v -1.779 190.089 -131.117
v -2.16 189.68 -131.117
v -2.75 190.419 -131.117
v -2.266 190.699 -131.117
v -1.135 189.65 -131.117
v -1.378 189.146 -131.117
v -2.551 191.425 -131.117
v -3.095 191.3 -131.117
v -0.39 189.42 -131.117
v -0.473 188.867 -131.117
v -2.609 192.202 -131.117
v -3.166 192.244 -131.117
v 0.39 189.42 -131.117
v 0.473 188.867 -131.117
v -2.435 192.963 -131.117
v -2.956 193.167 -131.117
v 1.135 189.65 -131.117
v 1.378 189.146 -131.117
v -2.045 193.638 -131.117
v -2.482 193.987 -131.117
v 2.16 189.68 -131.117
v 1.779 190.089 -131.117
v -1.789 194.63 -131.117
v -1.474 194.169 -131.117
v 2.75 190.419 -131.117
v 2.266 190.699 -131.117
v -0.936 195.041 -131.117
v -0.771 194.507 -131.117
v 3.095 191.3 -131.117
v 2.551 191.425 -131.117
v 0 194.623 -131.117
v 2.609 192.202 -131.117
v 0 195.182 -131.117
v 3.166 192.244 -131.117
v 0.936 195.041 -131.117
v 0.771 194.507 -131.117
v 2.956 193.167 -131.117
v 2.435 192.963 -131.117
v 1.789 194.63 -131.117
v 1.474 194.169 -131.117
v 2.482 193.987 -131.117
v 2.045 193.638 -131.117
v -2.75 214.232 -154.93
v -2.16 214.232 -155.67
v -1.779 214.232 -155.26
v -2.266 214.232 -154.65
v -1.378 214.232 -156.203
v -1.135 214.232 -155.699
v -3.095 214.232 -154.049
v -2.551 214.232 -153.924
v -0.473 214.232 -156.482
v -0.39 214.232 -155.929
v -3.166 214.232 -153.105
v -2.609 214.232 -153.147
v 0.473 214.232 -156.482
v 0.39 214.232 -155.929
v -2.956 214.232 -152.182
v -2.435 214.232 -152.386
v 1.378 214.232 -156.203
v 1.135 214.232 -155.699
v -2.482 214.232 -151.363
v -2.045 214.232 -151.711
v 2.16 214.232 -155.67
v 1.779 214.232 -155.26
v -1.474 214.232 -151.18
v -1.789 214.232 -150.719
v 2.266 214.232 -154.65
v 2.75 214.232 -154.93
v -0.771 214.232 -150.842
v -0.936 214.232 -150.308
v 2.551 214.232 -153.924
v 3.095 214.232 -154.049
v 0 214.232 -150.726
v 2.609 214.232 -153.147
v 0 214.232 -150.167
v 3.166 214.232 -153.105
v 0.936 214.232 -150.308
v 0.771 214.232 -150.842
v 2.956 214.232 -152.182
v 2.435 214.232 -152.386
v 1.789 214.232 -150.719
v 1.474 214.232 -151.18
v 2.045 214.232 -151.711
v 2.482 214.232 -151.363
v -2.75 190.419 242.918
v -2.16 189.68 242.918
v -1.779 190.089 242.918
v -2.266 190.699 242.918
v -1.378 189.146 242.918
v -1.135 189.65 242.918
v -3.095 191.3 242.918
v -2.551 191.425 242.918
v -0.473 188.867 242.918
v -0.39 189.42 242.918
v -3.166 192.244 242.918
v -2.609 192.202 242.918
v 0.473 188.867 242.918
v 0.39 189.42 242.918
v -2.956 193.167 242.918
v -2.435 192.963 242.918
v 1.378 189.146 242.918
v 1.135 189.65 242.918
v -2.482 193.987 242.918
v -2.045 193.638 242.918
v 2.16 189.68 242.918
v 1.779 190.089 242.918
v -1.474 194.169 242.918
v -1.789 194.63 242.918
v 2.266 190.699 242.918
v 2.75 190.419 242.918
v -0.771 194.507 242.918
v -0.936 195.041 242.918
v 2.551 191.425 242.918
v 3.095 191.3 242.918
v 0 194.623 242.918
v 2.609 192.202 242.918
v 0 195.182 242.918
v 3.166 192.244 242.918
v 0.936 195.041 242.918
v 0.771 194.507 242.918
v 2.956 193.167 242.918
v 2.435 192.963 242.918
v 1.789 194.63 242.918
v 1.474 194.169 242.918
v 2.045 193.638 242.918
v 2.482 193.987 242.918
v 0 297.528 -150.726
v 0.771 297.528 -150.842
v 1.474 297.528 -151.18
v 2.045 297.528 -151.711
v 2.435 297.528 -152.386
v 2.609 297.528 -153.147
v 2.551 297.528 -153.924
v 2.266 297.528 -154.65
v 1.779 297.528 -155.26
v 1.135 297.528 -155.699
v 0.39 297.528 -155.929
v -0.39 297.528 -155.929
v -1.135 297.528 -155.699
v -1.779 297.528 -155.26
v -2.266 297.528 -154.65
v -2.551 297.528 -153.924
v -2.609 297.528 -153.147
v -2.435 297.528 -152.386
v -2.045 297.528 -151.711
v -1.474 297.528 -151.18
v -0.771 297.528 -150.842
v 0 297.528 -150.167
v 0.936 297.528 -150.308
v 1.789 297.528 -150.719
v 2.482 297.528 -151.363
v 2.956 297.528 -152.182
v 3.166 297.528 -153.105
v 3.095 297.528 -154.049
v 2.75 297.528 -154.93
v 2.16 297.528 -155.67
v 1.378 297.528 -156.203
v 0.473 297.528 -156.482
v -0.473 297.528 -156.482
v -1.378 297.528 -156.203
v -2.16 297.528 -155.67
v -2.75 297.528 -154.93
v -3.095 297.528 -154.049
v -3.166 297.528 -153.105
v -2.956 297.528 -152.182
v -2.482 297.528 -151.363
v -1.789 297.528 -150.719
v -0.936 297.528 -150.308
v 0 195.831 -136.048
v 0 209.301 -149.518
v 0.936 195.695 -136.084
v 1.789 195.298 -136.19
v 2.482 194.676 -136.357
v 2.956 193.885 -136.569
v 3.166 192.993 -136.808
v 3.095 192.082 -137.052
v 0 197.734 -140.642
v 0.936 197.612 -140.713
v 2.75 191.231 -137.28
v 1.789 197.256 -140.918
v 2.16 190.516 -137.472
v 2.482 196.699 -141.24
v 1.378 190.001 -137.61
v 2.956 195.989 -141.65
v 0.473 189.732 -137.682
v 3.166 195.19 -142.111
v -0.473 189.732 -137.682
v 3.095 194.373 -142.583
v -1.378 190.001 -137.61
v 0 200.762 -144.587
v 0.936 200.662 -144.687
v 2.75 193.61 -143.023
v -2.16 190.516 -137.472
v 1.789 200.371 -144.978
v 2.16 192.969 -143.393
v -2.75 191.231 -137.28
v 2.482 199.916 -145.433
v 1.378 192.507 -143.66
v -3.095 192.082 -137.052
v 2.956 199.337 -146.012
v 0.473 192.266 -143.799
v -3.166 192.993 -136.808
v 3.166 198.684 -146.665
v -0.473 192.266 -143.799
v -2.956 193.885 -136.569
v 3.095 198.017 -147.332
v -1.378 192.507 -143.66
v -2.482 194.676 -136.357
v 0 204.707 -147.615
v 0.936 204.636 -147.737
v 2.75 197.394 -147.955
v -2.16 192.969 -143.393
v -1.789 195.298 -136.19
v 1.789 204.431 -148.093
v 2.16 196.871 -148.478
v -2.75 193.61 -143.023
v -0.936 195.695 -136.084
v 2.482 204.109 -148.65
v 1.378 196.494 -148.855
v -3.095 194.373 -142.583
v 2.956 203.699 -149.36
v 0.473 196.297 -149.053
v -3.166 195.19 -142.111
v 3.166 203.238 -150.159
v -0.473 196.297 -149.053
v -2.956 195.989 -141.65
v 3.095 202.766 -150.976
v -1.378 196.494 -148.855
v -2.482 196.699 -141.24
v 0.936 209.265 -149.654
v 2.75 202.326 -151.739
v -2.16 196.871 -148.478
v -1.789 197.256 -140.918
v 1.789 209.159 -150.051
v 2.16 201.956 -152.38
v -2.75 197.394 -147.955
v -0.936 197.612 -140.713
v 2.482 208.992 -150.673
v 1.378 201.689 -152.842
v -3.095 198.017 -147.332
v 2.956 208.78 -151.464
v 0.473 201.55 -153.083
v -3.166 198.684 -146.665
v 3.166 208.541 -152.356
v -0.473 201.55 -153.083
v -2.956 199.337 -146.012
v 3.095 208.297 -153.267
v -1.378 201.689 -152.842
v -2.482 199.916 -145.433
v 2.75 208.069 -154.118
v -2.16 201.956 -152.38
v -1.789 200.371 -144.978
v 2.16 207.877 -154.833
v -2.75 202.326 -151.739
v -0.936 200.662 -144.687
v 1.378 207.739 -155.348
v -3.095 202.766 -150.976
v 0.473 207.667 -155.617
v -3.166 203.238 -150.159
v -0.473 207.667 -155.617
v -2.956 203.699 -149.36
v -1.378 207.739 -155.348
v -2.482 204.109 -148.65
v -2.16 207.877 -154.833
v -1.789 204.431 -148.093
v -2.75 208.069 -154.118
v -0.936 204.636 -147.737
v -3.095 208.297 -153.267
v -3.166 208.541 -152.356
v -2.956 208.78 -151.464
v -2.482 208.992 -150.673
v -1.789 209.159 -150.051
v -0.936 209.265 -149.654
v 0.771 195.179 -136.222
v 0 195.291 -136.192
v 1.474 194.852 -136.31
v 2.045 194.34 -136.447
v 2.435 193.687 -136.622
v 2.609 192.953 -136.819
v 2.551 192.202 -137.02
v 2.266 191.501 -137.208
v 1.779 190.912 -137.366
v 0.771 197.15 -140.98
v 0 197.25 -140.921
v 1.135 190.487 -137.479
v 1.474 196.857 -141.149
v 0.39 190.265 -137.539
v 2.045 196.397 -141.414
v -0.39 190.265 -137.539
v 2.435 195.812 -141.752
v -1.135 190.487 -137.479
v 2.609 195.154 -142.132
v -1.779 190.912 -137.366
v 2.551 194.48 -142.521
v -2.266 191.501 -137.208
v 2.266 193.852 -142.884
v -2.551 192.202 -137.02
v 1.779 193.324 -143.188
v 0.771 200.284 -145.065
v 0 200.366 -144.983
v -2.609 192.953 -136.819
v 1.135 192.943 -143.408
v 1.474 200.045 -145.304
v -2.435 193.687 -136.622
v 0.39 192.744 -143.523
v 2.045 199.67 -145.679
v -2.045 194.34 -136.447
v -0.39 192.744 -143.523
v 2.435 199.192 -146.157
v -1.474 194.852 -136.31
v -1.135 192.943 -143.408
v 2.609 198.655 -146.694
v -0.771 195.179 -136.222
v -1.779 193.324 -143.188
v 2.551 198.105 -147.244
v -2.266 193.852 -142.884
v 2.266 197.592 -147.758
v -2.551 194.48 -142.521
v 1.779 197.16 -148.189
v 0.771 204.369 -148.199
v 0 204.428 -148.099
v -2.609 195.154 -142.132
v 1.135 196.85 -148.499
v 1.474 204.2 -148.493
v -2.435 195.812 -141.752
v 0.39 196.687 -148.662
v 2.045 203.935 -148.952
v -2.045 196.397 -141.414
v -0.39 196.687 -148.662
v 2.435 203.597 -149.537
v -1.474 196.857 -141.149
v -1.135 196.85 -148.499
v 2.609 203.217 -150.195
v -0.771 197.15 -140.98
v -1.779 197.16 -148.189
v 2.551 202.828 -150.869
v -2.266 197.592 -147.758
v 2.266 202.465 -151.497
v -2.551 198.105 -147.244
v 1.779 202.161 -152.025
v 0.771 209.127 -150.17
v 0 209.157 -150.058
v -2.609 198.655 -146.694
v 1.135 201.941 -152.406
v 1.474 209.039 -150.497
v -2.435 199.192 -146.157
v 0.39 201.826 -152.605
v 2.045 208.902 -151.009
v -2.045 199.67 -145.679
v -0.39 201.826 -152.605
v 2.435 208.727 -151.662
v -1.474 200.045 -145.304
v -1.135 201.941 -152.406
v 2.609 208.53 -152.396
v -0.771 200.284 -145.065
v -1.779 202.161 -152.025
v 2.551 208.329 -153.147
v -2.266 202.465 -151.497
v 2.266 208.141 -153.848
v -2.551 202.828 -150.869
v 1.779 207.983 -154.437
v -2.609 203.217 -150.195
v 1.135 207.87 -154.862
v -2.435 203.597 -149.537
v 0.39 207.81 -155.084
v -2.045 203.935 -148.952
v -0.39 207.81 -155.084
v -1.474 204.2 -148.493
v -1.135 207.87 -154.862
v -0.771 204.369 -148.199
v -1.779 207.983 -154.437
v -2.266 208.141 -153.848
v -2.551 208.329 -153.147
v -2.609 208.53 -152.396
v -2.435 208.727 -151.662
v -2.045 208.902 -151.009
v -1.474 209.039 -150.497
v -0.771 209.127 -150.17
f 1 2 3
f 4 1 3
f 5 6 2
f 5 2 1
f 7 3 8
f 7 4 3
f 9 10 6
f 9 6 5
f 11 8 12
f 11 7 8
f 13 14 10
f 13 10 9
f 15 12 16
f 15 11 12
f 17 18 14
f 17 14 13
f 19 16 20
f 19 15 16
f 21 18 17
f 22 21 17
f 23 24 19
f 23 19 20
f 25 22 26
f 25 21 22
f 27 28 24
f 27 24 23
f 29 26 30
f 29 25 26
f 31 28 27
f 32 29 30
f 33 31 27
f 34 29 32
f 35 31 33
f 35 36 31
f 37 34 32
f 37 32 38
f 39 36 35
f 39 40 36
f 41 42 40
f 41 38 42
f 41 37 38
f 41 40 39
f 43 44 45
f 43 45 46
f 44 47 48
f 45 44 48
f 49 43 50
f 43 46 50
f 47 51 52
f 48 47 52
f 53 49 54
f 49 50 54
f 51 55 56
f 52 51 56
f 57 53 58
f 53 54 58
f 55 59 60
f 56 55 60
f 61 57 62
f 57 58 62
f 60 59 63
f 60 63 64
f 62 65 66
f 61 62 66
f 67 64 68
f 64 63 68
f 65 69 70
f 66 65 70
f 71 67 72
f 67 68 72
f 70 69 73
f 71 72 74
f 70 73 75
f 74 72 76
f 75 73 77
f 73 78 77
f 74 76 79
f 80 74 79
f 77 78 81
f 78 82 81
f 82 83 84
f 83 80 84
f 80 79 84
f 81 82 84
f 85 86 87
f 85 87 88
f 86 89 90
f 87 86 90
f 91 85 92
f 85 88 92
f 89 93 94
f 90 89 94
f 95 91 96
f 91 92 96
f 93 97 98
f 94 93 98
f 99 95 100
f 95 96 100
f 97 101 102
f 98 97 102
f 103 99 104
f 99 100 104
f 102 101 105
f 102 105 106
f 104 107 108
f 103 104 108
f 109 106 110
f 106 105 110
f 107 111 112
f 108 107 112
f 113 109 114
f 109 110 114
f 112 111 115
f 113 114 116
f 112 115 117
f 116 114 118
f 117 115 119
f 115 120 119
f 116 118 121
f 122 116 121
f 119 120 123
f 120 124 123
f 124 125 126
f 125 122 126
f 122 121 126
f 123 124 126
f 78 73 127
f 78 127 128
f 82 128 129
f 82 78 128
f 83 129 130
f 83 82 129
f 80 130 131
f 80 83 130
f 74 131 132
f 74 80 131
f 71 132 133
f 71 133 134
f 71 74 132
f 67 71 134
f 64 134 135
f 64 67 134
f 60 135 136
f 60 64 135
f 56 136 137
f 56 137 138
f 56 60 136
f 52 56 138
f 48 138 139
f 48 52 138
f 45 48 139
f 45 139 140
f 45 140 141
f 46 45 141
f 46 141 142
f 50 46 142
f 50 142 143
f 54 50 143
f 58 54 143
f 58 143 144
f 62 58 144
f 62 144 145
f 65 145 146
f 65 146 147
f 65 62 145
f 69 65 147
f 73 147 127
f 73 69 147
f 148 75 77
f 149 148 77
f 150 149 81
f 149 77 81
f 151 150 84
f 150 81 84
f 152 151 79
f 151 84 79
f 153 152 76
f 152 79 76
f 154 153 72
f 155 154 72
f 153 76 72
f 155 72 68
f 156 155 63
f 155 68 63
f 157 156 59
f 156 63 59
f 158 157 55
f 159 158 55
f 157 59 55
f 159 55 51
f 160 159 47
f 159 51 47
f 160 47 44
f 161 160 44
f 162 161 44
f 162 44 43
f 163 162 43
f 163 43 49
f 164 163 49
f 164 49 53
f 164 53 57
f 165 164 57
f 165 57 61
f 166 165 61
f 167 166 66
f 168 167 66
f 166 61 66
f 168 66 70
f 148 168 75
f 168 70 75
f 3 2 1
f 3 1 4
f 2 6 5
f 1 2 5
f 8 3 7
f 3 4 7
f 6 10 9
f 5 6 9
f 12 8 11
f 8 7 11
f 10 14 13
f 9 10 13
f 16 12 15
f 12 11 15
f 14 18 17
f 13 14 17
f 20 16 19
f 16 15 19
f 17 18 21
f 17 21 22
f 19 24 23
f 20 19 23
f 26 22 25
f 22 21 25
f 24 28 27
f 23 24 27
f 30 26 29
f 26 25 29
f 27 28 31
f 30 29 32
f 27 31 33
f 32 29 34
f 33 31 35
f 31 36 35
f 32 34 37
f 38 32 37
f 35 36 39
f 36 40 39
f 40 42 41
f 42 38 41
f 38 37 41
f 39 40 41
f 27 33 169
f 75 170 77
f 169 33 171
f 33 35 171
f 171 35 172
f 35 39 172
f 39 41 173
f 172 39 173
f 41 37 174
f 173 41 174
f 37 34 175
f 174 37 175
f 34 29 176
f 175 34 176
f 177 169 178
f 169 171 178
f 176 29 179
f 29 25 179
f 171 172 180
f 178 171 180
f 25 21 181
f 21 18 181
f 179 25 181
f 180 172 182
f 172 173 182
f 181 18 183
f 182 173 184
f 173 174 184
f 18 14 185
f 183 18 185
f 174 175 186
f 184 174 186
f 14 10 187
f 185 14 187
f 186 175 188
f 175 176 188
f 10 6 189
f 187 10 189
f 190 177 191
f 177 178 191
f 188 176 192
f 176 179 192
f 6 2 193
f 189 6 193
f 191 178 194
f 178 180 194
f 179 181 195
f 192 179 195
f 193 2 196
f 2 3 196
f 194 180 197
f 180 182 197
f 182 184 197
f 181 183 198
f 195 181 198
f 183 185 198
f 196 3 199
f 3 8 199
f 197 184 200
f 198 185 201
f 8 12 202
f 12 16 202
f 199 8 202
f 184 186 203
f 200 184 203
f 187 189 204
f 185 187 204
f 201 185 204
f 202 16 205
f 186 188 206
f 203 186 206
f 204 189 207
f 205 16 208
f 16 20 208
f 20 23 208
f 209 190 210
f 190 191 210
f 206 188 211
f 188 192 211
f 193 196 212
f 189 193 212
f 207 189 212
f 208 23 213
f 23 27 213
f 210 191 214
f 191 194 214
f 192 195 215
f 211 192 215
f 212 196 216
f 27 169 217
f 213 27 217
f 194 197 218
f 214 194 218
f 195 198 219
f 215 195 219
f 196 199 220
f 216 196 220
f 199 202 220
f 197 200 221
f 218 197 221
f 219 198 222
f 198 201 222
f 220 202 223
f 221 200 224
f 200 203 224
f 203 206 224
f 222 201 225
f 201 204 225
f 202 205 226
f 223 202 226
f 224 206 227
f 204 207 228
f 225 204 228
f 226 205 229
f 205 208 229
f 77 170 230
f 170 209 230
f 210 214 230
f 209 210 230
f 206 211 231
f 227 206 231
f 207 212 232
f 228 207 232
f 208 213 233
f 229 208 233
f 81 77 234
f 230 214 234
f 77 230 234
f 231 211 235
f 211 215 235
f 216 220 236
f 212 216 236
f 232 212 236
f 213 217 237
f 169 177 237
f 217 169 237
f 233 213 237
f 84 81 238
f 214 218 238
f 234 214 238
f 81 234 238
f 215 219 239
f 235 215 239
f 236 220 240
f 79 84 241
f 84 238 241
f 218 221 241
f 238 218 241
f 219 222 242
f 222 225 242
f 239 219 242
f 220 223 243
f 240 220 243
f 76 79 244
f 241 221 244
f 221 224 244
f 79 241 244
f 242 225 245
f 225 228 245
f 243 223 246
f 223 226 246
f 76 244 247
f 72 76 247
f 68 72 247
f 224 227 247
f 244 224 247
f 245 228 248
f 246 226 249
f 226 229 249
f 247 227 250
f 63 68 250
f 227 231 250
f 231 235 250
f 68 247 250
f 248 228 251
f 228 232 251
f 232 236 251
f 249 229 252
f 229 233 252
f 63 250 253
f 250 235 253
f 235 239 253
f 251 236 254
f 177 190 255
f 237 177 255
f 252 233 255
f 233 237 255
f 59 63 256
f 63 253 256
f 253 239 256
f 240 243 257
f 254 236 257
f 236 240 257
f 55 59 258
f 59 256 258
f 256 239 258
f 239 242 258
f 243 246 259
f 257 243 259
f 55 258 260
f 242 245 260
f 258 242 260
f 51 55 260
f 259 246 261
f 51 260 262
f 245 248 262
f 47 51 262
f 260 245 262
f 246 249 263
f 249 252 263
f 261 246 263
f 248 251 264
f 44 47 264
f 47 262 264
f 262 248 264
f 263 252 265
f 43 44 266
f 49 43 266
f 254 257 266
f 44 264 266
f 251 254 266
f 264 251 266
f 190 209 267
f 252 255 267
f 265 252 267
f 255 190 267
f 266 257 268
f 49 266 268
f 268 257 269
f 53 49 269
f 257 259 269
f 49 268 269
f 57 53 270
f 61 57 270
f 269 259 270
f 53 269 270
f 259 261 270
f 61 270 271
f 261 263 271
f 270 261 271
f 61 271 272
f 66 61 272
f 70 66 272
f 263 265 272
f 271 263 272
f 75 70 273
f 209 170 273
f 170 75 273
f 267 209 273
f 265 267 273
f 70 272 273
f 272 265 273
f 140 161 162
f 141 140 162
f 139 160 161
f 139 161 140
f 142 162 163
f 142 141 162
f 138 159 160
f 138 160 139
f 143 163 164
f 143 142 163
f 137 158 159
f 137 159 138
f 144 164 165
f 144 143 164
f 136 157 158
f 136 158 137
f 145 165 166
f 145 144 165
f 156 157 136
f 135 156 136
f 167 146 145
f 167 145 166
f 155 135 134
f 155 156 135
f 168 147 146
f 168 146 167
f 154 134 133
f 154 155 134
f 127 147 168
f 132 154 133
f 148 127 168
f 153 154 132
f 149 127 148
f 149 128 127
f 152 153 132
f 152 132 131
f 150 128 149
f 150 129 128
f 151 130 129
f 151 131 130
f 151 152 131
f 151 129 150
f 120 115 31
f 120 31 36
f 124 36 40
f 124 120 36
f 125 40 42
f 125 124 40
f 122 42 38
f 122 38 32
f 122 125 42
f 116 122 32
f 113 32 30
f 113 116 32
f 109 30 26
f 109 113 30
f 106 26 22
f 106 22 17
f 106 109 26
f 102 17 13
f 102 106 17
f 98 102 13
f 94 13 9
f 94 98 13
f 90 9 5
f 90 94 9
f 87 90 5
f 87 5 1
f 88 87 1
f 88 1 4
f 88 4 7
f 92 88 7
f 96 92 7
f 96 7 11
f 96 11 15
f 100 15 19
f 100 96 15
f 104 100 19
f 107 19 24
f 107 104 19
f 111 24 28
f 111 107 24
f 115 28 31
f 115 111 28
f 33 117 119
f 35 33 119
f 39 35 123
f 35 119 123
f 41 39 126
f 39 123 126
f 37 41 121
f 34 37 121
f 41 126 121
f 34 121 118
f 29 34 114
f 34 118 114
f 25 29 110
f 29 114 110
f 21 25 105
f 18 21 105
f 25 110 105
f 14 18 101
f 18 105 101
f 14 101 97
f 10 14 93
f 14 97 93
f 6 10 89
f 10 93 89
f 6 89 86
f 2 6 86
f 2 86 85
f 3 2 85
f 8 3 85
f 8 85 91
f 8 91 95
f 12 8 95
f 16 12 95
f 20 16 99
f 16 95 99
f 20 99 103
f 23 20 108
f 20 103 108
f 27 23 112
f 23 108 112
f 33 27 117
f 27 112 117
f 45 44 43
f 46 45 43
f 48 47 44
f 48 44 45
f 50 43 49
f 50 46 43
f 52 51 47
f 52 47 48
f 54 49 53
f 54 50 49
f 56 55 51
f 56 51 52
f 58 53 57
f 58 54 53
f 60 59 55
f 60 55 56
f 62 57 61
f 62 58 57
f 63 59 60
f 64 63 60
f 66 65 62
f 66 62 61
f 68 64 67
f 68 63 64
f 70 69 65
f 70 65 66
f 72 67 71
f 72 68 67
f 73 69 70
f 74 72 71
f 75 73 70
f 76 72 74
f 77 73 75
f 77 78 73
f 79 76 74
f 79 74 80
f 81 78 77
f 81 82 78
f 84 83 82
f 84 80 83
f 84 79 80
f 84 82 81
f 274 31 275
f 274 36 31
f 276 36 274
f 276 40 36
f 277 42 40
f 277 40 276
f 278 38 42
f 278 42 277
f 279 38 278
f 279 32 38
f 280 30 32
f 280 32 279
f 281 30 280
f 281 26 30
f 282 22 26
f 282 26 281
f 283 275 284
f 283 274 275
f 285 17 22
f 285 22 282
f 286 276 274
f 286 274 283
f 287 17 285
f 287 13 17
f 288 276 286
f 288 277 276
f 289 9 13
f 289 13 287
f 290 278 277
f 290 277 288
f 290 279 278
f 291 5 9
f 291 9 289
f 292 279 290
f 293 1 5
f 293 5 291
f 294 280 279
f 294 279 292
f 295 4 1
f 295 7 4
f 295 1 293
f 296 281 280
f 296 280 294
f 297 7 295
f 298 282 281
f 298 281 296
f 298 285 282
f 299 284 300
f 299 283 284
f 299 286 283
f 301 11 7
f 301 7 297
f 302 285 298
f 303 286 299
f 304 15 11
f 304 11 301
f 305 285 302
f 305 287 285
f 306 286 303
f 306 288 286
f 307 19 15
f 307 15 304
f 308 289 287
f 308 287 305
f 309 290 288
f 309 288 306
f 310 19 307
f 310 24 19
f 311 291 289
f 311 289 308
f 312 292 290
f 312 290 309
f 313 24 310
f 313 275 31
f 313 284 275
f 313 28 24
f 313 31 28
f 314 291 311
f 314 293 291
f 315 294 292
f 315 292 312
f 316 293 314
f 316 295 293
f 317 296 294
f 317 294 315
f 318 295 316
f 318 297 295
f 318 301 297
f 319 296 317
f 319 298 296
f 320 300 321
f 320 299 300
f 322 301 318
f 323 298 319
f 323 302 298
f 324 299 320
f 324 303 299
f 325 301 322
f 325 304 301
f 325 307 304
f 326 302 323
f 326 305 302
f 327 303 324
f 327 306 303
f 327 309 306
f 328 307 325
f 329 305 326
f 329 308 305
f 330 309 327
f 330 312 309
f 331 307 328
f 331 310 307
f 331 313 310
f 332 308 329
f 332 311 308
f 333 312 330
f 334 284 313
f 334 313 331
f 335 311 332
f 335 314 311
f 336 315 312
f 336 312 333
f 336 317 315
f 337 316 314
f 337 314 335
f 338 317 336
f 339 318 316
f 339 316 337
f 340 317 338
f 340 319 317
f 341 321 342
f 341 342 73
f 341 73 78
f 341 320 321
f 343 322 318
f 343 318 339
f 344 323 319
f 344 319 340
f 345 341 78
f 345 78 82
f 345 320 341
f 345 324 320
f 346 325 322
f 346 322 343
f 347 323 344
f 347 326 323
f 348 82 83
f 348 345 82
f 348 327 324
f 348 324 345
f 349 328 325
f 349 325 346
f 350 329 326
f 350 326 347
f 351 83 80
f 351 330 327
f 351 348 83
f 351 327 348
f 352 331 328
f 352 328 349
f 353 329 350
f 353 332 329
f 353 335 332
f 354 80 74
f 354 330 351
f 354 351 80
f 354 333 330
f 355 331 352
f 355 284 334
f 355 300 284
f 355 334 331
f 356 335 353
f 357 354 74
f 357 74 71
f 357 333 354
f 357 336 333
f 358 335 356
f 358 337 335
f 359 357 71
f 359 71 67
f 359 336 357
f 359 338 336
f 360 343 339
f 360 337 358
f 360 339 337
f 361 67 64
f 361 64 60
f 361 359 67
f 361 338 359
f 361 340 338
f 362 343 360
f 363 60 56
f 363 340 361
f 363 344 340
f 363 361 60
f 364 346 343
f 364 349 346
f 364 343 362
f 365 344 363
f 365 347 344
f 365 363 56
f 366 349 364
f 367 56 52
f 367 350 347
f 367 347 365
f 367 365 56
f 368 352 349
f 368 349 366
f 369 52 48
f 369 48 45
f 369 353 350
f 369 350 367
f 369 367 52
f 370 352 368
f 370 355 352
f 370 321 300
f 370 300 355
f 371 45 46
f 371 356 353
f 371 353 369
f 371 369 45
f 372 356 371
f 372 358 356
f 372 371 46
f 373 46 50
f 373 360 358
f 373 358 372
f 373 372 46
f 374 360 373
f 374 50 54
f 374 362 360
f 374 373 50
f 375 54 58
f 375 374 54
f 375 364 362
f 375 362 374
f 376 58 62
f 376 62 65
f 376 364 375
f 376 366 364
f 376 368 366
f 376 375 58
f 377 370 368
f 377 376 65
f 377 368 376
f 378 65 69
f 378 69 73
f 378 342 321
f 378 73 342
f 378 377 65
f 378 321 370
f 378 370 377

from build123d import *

# Parameters (mm, degrees)
SKETCH11_R                = 3.175
SKETCH11_R_2              = 2.6162
PIPE_0_5_SCH_40_1_DEPTH   = 374.034711
SKETCH11_ON_SEGMENT_2_R   = 3.175
SKETCH11_ON_SEGMENT_2_R_2 = 2.6162
PIPE_0_5_SCH_40_1_2_ANGLE = 90
SKETCH11_ON_SEGMENT_3_R   = 3.175
SKETCH11_ON_SEGMENT_3_R_2 = 2.6162
PIPE_0_5_SCH_40_1_3_DEPTH = 83.295965609


with BuildPart() as part:
    # Sketch11 → Pipe 0.5 SCH 40(1) (new body)
    with BuildSketch(Plane(origin=(0, 192.006959968, 242.917619127), x_dir=(0, 1, 0), z_dir=(0, 0, -1))):
        Circle(SKETCH11_R)
        Circle(SKETCH11_R_2, mode=Mode.SUBTRACT)
    extrude(amount=PIPE_0_5_SCH_40_1_DEPTH)


with BuildPart() as body_2:
    # Sketch11 on segment 2 (carried to the start of arc 2) → Pipe 0.5 SCH 40_1 2 (revolve)
    with BuildSketch(Plane(origin=(0, 192.006959968, -131.117091873), x_dir=(0, 1, 0), z_dir=(0, 0, -1))):
        Circle(SKETCH11_ON_SEGMENT_2_R)
        Circle(SKETCH11_ON_SEGMENT_2_R_2, mode=Mode.SUBTRACT)
    revolve(axis=Axis((0, 214.231959968, -131.117091873), (1, 0, 0)), revolution_arc=PIPE_0_5_SCH_40_1_2_ANGLE)


with BuildPart() as body_3:
    # Sketch11 on segment 3 (carried to segment 3) → Pipe 0.5 SCH 40_1 3 (new body)
    with BuildSketch(Plane(origin=(0, 214.231959968, -153.342091873), x_dir=(0, 0, 1), z_dir=(0, 1, 0))):
        Circle(SKETCH11_ON_SEGMENT_3_R)
        Circle(SKETCH11_ON_SEGMENT_3_R_2, mode=Mode.SUBTRACT)
    extrude(amount=PIPE_0_5_SCH_40_1_3_DEPTH)


solid = Compound([part.part, body_2.part, body_3.part])
